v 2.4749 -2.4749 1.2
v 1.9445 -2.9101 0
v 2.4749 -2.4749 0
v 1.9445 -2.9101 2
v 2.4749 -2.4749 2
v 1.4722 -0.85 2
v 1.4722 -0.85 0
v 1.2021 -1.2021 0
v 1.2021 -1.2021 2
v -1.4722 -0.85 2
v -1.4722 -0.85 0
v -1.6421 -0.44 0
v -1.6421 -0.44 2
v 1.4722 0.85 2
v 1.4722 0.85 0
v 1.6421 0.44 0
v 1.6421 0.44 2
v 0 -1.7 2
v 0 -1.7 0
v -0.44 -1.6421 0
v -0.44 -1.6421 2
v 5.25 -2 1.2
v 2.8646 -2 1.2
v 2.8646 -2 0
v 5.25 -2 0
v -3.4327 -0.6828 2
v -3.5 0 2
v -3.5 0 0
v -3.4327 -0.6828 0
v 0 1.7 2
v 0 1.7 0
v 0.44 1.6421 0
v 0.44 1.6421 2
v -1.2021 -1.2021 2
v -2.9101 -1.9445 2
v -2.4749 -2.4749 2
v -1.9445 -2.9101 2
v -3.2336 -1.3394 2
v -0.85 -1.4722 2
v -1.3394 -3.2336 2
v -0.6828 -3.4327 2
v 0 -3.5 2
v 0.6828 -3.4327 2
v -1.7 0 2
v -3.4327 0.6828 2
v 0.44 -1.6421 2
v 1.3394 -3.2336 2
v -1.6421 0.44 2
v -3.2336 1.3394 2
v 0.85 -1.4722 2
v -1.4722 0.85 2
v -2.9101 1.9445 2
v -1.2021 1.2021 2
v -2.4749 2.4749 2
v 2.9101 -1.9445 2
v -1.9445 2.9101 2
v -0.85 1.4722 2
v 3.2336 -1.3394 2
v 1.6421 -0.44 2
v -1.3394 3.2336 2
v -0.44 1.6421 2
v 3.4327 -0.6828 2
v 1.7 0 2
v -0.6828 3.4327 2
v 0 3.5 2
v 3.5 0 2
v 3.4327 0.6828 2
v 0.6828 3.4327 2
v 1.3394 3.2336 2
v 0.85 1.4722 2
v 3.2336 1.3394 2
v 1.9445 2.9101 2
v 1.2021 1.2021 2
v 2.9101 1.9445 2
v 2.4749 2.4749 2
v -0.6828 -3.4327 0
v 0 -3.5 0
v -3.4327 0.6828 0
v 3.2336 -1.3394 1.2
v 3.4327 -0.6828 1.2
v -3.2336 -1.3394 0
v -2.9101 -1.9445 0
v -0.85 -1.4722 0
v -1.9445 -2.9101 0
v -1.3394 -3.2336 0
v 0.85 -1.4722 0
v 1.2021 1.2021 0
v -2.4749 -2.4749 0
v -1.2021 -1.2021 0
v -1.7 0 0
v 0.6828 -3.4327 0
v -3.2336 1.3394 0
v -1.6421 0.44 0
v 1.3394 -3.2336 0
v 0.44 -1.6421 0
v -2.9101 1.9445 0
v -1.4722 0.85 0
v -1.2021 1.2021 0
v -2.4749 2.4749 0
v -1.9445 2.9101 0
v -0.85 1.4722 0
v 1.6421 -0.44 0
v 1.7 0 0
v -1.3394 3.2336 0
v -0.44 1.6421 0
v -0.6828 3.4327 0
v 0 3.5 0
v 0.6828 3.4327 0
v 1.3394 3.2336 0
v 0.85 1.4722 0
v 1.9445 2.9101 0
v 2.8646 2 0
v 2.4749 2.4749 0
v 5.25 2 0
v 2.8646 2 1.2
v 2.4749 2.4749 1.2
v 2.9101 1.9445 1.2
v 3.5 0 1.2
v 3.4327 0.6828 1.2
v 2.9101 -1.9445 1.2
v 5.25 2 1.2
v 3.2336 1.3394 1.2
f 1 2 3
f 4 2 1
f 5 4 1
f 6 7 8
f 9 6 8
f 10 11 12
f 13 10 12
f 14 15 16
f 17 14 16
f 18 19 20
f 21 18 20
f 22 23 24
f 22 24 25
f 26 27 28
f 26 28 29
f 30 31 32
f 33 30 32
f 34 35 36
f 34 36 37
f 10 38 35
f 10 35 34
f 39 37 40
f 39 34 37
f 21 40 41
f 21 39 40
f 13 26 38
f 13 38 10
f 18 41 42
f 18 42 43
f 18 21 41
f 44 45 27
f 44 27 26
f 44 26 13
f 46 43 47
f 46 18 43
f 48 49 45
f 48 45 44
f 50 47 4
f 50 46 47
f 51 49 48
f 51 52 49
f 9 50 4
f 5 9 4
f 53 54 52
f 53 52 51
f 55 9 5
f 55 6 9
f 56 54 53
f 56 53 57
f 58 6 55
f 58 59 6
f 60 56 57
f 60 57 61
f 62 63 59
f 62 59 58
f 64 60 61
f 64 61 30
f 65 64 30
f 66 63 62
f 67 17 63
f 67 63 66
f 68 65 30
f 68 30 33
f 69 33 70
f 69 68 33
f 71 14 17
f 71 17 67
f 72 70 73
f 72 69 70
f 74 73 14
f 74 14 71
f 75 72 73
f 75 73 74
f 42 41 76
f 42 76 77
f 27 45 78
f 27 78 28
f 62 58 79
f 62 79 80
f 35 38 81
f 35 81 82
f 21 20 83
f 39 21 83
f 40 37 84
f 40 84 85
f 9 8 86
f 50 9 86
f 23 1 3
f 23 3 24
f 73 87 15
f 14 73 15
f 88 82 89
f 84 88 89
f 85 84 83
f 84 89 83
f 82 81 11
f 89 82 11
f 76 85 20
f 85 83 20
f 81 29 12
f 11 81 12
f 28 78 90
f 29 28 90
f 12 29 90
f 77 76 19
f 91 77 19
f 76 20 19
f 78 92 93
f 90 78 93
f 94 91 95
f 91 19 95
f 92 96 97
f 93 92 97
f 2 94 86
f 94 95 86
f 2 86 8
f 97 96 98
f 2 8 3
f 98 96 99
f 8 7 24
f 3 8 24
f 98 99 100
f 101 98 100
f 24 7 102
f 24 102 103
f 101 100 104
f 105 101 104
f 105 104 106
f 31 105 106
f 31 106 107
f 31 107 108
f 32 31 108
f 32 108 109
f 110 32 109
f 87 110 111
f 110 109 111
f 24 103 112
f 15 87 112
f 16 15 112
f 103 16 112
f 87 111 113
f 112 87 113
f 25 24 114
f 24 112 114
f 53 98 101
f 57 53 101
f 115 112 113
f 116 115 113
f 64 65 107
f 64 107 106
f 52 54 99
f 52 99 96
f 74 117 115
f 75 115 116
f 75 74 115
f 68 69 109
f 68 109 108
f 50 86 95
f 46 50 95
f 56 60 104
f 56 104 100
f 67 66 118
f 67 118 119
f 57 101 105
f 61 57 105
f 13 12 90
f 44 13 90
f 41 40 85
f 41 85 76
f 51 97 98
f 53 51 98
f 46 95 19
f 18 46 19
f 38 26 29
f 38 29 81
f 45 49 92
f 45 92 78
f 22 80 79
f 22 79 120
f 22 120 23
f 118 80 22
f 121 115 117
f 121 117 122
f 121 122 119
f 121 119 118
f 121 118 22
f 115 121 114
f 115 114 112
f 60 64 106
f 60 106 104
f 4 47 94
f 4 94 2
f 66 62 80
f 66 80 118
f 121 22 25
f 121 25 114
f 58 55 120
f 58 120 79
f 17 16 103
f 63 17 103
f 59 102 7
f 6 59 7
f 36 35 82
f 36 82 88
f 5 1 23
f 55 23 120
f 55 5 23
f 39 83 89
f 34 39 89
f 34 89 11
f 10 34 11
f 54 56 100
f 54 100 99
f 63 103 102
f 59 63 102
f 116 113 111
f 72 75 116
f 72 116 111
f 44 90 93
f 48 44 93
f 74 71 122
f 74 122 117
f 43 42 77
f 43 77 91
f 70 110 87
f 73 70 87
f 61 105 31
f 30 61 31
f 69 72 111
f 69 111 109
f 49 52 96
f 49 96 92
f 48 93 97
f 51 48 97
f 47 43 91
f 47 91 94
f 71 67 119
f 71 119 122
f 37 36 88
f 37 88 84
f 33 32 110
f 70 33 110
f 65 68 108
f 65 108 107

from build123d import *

# Parameters (mm, degrees)
BOSS_EXTRUDE1_DEPTH = 0.800000038
BOSS_EXTRUDE2_DEPTH = 1.200000057
CUT_EXTRUDE1_DEPTH  = 7.619101177


with BuildPart() as part:
    # Sketch1 → Boss-Extrude1 (new body)
    with BuildSketch(Plane.XY.offset(2.000000095)):
        Polygon((1.944495831, 2.910143696), (1.339392038, 3.233578522), (0.682816142, 3.432748606), (0, 3.500000108), (-0.682816142, 3.432748606), (-1.339392038, 3.233578522), (-1.944495831, 2.910143696), (-2.474873792, 2.474873792), (-2.910143696, 1.944495831), (-3.233578522, 1.339392038), (-3.432748606, 0.682816142), (-3.500000108, 0), (-3.432748606, -0.682816142), (-3.233578522, -1.339392038), (-2.910143696, -1.944495831), (-2.474873792, -2.474873792), (-1.944495831, -2.910143696), (-1.339392038, -3.233578522), (-0.682816142, -3.432748606), (0, -3.500000108), (0.682816142, -3.432748606), (1.339392038, -3.233578522), (1.944495831, -2.910143696), (2.474873792, -2.474873792), (2.910143696, -1.944495831), (3.233578522, -1.339392038), (3.432748606, -0.682816142), (3.500000108, 0), (3.432748606, 0.682816142), (3.233578522, 1.339392038), (2.910143696, 1.944495831), (2.474873792, 2.474873792), align=None)
    extrude(amount=-BOSS_EXTRUDE1_DEPTH)

    # Sketch2 → Boss-Extrude2 (add)
    with BuildSketch(Plane(origin=(0, 0, 1.200000057), x_dir=(-1, 0, 0), z_dir=(0, 0, -1))):
        Polygon((-5.249999929, -2.000000095), (-5.249999929, 2.000000095), (-2.864592476, 2.000000095), (-2.474873792, 2.474873792), (-1.944495831, 2.910143696), (-1.339392038, 3.233578522), (-0.682816142, 3.432748606), (0, 3.500000108), (0.682816142, 3.432748606), (1.339392038, 3.233578522), (1.944495831, 2.910143696), (2.474873792, 2.474873792), (2.910143696, 1.944495831), (3.233578522, 1.339392038), (3.432748606, 0.682816142), (3.500000108, 0), (3.432748606, -0.682816142), (3.233578522, -1.339392038), (2.910143696, -1.944495831), (2.474873792, -2.474873792), (1.944495831, -2.910143696), (1.339392038, -3.233578522), (0.682816142, -3.432748606), (0, -3.500000108), (-0.682816142, -3.432748606), (-1.339392038, -3.233578522), (-1.944495831, -2.910143696), (-2.474873792, -2.474873792), (-2.864592476, -2.000000095), align=None)
    extrude(amount=BOSS_EXTRUDE2_DEPTH)

    # Sketch3 → Cut-Extrude1 (cut, through all)
    with BuildSketch(Plane(origin=(0, 0, 0), x_dir=(-1, 0, 0), z_dir=(0, 0, -1))):
        Polygon((-1.472243224, 0.850000011), (-1.642073854, 0.439992378), (-1.700000023, 0), (-1.642073854, -0.439992378), (-1.472243224, -0.850000011), (-1.202081563, -1.202081563), (-0.850000011, -1.472243224), (-0.439992378, -1.642073854), (0, -1.700000023), (0.439992378, -1.642073854), (0.850000011, -1.472243224), (1.202081563, -1.202081563), (1.472243224, -0.850000011), (1.642073854, -0.439992378), (1.700000023, 0), (1.642073854, 0.439992378), (1.472243224, 0.850000011), (1.202081563, 1.202081563), (0.850000011, 1.472243224), (0.439992378, 1.642073854), (0, 1.700000023), (-0.439992378, 1.642073854), (-0.850000011, 1.472243224), (-1.202081563, 1.202081563), align=None)
    extrude(amount=-CUT_EXTRUDE1_DEPTH, mode=Mode.SUBTRACT)


solid = part.part
